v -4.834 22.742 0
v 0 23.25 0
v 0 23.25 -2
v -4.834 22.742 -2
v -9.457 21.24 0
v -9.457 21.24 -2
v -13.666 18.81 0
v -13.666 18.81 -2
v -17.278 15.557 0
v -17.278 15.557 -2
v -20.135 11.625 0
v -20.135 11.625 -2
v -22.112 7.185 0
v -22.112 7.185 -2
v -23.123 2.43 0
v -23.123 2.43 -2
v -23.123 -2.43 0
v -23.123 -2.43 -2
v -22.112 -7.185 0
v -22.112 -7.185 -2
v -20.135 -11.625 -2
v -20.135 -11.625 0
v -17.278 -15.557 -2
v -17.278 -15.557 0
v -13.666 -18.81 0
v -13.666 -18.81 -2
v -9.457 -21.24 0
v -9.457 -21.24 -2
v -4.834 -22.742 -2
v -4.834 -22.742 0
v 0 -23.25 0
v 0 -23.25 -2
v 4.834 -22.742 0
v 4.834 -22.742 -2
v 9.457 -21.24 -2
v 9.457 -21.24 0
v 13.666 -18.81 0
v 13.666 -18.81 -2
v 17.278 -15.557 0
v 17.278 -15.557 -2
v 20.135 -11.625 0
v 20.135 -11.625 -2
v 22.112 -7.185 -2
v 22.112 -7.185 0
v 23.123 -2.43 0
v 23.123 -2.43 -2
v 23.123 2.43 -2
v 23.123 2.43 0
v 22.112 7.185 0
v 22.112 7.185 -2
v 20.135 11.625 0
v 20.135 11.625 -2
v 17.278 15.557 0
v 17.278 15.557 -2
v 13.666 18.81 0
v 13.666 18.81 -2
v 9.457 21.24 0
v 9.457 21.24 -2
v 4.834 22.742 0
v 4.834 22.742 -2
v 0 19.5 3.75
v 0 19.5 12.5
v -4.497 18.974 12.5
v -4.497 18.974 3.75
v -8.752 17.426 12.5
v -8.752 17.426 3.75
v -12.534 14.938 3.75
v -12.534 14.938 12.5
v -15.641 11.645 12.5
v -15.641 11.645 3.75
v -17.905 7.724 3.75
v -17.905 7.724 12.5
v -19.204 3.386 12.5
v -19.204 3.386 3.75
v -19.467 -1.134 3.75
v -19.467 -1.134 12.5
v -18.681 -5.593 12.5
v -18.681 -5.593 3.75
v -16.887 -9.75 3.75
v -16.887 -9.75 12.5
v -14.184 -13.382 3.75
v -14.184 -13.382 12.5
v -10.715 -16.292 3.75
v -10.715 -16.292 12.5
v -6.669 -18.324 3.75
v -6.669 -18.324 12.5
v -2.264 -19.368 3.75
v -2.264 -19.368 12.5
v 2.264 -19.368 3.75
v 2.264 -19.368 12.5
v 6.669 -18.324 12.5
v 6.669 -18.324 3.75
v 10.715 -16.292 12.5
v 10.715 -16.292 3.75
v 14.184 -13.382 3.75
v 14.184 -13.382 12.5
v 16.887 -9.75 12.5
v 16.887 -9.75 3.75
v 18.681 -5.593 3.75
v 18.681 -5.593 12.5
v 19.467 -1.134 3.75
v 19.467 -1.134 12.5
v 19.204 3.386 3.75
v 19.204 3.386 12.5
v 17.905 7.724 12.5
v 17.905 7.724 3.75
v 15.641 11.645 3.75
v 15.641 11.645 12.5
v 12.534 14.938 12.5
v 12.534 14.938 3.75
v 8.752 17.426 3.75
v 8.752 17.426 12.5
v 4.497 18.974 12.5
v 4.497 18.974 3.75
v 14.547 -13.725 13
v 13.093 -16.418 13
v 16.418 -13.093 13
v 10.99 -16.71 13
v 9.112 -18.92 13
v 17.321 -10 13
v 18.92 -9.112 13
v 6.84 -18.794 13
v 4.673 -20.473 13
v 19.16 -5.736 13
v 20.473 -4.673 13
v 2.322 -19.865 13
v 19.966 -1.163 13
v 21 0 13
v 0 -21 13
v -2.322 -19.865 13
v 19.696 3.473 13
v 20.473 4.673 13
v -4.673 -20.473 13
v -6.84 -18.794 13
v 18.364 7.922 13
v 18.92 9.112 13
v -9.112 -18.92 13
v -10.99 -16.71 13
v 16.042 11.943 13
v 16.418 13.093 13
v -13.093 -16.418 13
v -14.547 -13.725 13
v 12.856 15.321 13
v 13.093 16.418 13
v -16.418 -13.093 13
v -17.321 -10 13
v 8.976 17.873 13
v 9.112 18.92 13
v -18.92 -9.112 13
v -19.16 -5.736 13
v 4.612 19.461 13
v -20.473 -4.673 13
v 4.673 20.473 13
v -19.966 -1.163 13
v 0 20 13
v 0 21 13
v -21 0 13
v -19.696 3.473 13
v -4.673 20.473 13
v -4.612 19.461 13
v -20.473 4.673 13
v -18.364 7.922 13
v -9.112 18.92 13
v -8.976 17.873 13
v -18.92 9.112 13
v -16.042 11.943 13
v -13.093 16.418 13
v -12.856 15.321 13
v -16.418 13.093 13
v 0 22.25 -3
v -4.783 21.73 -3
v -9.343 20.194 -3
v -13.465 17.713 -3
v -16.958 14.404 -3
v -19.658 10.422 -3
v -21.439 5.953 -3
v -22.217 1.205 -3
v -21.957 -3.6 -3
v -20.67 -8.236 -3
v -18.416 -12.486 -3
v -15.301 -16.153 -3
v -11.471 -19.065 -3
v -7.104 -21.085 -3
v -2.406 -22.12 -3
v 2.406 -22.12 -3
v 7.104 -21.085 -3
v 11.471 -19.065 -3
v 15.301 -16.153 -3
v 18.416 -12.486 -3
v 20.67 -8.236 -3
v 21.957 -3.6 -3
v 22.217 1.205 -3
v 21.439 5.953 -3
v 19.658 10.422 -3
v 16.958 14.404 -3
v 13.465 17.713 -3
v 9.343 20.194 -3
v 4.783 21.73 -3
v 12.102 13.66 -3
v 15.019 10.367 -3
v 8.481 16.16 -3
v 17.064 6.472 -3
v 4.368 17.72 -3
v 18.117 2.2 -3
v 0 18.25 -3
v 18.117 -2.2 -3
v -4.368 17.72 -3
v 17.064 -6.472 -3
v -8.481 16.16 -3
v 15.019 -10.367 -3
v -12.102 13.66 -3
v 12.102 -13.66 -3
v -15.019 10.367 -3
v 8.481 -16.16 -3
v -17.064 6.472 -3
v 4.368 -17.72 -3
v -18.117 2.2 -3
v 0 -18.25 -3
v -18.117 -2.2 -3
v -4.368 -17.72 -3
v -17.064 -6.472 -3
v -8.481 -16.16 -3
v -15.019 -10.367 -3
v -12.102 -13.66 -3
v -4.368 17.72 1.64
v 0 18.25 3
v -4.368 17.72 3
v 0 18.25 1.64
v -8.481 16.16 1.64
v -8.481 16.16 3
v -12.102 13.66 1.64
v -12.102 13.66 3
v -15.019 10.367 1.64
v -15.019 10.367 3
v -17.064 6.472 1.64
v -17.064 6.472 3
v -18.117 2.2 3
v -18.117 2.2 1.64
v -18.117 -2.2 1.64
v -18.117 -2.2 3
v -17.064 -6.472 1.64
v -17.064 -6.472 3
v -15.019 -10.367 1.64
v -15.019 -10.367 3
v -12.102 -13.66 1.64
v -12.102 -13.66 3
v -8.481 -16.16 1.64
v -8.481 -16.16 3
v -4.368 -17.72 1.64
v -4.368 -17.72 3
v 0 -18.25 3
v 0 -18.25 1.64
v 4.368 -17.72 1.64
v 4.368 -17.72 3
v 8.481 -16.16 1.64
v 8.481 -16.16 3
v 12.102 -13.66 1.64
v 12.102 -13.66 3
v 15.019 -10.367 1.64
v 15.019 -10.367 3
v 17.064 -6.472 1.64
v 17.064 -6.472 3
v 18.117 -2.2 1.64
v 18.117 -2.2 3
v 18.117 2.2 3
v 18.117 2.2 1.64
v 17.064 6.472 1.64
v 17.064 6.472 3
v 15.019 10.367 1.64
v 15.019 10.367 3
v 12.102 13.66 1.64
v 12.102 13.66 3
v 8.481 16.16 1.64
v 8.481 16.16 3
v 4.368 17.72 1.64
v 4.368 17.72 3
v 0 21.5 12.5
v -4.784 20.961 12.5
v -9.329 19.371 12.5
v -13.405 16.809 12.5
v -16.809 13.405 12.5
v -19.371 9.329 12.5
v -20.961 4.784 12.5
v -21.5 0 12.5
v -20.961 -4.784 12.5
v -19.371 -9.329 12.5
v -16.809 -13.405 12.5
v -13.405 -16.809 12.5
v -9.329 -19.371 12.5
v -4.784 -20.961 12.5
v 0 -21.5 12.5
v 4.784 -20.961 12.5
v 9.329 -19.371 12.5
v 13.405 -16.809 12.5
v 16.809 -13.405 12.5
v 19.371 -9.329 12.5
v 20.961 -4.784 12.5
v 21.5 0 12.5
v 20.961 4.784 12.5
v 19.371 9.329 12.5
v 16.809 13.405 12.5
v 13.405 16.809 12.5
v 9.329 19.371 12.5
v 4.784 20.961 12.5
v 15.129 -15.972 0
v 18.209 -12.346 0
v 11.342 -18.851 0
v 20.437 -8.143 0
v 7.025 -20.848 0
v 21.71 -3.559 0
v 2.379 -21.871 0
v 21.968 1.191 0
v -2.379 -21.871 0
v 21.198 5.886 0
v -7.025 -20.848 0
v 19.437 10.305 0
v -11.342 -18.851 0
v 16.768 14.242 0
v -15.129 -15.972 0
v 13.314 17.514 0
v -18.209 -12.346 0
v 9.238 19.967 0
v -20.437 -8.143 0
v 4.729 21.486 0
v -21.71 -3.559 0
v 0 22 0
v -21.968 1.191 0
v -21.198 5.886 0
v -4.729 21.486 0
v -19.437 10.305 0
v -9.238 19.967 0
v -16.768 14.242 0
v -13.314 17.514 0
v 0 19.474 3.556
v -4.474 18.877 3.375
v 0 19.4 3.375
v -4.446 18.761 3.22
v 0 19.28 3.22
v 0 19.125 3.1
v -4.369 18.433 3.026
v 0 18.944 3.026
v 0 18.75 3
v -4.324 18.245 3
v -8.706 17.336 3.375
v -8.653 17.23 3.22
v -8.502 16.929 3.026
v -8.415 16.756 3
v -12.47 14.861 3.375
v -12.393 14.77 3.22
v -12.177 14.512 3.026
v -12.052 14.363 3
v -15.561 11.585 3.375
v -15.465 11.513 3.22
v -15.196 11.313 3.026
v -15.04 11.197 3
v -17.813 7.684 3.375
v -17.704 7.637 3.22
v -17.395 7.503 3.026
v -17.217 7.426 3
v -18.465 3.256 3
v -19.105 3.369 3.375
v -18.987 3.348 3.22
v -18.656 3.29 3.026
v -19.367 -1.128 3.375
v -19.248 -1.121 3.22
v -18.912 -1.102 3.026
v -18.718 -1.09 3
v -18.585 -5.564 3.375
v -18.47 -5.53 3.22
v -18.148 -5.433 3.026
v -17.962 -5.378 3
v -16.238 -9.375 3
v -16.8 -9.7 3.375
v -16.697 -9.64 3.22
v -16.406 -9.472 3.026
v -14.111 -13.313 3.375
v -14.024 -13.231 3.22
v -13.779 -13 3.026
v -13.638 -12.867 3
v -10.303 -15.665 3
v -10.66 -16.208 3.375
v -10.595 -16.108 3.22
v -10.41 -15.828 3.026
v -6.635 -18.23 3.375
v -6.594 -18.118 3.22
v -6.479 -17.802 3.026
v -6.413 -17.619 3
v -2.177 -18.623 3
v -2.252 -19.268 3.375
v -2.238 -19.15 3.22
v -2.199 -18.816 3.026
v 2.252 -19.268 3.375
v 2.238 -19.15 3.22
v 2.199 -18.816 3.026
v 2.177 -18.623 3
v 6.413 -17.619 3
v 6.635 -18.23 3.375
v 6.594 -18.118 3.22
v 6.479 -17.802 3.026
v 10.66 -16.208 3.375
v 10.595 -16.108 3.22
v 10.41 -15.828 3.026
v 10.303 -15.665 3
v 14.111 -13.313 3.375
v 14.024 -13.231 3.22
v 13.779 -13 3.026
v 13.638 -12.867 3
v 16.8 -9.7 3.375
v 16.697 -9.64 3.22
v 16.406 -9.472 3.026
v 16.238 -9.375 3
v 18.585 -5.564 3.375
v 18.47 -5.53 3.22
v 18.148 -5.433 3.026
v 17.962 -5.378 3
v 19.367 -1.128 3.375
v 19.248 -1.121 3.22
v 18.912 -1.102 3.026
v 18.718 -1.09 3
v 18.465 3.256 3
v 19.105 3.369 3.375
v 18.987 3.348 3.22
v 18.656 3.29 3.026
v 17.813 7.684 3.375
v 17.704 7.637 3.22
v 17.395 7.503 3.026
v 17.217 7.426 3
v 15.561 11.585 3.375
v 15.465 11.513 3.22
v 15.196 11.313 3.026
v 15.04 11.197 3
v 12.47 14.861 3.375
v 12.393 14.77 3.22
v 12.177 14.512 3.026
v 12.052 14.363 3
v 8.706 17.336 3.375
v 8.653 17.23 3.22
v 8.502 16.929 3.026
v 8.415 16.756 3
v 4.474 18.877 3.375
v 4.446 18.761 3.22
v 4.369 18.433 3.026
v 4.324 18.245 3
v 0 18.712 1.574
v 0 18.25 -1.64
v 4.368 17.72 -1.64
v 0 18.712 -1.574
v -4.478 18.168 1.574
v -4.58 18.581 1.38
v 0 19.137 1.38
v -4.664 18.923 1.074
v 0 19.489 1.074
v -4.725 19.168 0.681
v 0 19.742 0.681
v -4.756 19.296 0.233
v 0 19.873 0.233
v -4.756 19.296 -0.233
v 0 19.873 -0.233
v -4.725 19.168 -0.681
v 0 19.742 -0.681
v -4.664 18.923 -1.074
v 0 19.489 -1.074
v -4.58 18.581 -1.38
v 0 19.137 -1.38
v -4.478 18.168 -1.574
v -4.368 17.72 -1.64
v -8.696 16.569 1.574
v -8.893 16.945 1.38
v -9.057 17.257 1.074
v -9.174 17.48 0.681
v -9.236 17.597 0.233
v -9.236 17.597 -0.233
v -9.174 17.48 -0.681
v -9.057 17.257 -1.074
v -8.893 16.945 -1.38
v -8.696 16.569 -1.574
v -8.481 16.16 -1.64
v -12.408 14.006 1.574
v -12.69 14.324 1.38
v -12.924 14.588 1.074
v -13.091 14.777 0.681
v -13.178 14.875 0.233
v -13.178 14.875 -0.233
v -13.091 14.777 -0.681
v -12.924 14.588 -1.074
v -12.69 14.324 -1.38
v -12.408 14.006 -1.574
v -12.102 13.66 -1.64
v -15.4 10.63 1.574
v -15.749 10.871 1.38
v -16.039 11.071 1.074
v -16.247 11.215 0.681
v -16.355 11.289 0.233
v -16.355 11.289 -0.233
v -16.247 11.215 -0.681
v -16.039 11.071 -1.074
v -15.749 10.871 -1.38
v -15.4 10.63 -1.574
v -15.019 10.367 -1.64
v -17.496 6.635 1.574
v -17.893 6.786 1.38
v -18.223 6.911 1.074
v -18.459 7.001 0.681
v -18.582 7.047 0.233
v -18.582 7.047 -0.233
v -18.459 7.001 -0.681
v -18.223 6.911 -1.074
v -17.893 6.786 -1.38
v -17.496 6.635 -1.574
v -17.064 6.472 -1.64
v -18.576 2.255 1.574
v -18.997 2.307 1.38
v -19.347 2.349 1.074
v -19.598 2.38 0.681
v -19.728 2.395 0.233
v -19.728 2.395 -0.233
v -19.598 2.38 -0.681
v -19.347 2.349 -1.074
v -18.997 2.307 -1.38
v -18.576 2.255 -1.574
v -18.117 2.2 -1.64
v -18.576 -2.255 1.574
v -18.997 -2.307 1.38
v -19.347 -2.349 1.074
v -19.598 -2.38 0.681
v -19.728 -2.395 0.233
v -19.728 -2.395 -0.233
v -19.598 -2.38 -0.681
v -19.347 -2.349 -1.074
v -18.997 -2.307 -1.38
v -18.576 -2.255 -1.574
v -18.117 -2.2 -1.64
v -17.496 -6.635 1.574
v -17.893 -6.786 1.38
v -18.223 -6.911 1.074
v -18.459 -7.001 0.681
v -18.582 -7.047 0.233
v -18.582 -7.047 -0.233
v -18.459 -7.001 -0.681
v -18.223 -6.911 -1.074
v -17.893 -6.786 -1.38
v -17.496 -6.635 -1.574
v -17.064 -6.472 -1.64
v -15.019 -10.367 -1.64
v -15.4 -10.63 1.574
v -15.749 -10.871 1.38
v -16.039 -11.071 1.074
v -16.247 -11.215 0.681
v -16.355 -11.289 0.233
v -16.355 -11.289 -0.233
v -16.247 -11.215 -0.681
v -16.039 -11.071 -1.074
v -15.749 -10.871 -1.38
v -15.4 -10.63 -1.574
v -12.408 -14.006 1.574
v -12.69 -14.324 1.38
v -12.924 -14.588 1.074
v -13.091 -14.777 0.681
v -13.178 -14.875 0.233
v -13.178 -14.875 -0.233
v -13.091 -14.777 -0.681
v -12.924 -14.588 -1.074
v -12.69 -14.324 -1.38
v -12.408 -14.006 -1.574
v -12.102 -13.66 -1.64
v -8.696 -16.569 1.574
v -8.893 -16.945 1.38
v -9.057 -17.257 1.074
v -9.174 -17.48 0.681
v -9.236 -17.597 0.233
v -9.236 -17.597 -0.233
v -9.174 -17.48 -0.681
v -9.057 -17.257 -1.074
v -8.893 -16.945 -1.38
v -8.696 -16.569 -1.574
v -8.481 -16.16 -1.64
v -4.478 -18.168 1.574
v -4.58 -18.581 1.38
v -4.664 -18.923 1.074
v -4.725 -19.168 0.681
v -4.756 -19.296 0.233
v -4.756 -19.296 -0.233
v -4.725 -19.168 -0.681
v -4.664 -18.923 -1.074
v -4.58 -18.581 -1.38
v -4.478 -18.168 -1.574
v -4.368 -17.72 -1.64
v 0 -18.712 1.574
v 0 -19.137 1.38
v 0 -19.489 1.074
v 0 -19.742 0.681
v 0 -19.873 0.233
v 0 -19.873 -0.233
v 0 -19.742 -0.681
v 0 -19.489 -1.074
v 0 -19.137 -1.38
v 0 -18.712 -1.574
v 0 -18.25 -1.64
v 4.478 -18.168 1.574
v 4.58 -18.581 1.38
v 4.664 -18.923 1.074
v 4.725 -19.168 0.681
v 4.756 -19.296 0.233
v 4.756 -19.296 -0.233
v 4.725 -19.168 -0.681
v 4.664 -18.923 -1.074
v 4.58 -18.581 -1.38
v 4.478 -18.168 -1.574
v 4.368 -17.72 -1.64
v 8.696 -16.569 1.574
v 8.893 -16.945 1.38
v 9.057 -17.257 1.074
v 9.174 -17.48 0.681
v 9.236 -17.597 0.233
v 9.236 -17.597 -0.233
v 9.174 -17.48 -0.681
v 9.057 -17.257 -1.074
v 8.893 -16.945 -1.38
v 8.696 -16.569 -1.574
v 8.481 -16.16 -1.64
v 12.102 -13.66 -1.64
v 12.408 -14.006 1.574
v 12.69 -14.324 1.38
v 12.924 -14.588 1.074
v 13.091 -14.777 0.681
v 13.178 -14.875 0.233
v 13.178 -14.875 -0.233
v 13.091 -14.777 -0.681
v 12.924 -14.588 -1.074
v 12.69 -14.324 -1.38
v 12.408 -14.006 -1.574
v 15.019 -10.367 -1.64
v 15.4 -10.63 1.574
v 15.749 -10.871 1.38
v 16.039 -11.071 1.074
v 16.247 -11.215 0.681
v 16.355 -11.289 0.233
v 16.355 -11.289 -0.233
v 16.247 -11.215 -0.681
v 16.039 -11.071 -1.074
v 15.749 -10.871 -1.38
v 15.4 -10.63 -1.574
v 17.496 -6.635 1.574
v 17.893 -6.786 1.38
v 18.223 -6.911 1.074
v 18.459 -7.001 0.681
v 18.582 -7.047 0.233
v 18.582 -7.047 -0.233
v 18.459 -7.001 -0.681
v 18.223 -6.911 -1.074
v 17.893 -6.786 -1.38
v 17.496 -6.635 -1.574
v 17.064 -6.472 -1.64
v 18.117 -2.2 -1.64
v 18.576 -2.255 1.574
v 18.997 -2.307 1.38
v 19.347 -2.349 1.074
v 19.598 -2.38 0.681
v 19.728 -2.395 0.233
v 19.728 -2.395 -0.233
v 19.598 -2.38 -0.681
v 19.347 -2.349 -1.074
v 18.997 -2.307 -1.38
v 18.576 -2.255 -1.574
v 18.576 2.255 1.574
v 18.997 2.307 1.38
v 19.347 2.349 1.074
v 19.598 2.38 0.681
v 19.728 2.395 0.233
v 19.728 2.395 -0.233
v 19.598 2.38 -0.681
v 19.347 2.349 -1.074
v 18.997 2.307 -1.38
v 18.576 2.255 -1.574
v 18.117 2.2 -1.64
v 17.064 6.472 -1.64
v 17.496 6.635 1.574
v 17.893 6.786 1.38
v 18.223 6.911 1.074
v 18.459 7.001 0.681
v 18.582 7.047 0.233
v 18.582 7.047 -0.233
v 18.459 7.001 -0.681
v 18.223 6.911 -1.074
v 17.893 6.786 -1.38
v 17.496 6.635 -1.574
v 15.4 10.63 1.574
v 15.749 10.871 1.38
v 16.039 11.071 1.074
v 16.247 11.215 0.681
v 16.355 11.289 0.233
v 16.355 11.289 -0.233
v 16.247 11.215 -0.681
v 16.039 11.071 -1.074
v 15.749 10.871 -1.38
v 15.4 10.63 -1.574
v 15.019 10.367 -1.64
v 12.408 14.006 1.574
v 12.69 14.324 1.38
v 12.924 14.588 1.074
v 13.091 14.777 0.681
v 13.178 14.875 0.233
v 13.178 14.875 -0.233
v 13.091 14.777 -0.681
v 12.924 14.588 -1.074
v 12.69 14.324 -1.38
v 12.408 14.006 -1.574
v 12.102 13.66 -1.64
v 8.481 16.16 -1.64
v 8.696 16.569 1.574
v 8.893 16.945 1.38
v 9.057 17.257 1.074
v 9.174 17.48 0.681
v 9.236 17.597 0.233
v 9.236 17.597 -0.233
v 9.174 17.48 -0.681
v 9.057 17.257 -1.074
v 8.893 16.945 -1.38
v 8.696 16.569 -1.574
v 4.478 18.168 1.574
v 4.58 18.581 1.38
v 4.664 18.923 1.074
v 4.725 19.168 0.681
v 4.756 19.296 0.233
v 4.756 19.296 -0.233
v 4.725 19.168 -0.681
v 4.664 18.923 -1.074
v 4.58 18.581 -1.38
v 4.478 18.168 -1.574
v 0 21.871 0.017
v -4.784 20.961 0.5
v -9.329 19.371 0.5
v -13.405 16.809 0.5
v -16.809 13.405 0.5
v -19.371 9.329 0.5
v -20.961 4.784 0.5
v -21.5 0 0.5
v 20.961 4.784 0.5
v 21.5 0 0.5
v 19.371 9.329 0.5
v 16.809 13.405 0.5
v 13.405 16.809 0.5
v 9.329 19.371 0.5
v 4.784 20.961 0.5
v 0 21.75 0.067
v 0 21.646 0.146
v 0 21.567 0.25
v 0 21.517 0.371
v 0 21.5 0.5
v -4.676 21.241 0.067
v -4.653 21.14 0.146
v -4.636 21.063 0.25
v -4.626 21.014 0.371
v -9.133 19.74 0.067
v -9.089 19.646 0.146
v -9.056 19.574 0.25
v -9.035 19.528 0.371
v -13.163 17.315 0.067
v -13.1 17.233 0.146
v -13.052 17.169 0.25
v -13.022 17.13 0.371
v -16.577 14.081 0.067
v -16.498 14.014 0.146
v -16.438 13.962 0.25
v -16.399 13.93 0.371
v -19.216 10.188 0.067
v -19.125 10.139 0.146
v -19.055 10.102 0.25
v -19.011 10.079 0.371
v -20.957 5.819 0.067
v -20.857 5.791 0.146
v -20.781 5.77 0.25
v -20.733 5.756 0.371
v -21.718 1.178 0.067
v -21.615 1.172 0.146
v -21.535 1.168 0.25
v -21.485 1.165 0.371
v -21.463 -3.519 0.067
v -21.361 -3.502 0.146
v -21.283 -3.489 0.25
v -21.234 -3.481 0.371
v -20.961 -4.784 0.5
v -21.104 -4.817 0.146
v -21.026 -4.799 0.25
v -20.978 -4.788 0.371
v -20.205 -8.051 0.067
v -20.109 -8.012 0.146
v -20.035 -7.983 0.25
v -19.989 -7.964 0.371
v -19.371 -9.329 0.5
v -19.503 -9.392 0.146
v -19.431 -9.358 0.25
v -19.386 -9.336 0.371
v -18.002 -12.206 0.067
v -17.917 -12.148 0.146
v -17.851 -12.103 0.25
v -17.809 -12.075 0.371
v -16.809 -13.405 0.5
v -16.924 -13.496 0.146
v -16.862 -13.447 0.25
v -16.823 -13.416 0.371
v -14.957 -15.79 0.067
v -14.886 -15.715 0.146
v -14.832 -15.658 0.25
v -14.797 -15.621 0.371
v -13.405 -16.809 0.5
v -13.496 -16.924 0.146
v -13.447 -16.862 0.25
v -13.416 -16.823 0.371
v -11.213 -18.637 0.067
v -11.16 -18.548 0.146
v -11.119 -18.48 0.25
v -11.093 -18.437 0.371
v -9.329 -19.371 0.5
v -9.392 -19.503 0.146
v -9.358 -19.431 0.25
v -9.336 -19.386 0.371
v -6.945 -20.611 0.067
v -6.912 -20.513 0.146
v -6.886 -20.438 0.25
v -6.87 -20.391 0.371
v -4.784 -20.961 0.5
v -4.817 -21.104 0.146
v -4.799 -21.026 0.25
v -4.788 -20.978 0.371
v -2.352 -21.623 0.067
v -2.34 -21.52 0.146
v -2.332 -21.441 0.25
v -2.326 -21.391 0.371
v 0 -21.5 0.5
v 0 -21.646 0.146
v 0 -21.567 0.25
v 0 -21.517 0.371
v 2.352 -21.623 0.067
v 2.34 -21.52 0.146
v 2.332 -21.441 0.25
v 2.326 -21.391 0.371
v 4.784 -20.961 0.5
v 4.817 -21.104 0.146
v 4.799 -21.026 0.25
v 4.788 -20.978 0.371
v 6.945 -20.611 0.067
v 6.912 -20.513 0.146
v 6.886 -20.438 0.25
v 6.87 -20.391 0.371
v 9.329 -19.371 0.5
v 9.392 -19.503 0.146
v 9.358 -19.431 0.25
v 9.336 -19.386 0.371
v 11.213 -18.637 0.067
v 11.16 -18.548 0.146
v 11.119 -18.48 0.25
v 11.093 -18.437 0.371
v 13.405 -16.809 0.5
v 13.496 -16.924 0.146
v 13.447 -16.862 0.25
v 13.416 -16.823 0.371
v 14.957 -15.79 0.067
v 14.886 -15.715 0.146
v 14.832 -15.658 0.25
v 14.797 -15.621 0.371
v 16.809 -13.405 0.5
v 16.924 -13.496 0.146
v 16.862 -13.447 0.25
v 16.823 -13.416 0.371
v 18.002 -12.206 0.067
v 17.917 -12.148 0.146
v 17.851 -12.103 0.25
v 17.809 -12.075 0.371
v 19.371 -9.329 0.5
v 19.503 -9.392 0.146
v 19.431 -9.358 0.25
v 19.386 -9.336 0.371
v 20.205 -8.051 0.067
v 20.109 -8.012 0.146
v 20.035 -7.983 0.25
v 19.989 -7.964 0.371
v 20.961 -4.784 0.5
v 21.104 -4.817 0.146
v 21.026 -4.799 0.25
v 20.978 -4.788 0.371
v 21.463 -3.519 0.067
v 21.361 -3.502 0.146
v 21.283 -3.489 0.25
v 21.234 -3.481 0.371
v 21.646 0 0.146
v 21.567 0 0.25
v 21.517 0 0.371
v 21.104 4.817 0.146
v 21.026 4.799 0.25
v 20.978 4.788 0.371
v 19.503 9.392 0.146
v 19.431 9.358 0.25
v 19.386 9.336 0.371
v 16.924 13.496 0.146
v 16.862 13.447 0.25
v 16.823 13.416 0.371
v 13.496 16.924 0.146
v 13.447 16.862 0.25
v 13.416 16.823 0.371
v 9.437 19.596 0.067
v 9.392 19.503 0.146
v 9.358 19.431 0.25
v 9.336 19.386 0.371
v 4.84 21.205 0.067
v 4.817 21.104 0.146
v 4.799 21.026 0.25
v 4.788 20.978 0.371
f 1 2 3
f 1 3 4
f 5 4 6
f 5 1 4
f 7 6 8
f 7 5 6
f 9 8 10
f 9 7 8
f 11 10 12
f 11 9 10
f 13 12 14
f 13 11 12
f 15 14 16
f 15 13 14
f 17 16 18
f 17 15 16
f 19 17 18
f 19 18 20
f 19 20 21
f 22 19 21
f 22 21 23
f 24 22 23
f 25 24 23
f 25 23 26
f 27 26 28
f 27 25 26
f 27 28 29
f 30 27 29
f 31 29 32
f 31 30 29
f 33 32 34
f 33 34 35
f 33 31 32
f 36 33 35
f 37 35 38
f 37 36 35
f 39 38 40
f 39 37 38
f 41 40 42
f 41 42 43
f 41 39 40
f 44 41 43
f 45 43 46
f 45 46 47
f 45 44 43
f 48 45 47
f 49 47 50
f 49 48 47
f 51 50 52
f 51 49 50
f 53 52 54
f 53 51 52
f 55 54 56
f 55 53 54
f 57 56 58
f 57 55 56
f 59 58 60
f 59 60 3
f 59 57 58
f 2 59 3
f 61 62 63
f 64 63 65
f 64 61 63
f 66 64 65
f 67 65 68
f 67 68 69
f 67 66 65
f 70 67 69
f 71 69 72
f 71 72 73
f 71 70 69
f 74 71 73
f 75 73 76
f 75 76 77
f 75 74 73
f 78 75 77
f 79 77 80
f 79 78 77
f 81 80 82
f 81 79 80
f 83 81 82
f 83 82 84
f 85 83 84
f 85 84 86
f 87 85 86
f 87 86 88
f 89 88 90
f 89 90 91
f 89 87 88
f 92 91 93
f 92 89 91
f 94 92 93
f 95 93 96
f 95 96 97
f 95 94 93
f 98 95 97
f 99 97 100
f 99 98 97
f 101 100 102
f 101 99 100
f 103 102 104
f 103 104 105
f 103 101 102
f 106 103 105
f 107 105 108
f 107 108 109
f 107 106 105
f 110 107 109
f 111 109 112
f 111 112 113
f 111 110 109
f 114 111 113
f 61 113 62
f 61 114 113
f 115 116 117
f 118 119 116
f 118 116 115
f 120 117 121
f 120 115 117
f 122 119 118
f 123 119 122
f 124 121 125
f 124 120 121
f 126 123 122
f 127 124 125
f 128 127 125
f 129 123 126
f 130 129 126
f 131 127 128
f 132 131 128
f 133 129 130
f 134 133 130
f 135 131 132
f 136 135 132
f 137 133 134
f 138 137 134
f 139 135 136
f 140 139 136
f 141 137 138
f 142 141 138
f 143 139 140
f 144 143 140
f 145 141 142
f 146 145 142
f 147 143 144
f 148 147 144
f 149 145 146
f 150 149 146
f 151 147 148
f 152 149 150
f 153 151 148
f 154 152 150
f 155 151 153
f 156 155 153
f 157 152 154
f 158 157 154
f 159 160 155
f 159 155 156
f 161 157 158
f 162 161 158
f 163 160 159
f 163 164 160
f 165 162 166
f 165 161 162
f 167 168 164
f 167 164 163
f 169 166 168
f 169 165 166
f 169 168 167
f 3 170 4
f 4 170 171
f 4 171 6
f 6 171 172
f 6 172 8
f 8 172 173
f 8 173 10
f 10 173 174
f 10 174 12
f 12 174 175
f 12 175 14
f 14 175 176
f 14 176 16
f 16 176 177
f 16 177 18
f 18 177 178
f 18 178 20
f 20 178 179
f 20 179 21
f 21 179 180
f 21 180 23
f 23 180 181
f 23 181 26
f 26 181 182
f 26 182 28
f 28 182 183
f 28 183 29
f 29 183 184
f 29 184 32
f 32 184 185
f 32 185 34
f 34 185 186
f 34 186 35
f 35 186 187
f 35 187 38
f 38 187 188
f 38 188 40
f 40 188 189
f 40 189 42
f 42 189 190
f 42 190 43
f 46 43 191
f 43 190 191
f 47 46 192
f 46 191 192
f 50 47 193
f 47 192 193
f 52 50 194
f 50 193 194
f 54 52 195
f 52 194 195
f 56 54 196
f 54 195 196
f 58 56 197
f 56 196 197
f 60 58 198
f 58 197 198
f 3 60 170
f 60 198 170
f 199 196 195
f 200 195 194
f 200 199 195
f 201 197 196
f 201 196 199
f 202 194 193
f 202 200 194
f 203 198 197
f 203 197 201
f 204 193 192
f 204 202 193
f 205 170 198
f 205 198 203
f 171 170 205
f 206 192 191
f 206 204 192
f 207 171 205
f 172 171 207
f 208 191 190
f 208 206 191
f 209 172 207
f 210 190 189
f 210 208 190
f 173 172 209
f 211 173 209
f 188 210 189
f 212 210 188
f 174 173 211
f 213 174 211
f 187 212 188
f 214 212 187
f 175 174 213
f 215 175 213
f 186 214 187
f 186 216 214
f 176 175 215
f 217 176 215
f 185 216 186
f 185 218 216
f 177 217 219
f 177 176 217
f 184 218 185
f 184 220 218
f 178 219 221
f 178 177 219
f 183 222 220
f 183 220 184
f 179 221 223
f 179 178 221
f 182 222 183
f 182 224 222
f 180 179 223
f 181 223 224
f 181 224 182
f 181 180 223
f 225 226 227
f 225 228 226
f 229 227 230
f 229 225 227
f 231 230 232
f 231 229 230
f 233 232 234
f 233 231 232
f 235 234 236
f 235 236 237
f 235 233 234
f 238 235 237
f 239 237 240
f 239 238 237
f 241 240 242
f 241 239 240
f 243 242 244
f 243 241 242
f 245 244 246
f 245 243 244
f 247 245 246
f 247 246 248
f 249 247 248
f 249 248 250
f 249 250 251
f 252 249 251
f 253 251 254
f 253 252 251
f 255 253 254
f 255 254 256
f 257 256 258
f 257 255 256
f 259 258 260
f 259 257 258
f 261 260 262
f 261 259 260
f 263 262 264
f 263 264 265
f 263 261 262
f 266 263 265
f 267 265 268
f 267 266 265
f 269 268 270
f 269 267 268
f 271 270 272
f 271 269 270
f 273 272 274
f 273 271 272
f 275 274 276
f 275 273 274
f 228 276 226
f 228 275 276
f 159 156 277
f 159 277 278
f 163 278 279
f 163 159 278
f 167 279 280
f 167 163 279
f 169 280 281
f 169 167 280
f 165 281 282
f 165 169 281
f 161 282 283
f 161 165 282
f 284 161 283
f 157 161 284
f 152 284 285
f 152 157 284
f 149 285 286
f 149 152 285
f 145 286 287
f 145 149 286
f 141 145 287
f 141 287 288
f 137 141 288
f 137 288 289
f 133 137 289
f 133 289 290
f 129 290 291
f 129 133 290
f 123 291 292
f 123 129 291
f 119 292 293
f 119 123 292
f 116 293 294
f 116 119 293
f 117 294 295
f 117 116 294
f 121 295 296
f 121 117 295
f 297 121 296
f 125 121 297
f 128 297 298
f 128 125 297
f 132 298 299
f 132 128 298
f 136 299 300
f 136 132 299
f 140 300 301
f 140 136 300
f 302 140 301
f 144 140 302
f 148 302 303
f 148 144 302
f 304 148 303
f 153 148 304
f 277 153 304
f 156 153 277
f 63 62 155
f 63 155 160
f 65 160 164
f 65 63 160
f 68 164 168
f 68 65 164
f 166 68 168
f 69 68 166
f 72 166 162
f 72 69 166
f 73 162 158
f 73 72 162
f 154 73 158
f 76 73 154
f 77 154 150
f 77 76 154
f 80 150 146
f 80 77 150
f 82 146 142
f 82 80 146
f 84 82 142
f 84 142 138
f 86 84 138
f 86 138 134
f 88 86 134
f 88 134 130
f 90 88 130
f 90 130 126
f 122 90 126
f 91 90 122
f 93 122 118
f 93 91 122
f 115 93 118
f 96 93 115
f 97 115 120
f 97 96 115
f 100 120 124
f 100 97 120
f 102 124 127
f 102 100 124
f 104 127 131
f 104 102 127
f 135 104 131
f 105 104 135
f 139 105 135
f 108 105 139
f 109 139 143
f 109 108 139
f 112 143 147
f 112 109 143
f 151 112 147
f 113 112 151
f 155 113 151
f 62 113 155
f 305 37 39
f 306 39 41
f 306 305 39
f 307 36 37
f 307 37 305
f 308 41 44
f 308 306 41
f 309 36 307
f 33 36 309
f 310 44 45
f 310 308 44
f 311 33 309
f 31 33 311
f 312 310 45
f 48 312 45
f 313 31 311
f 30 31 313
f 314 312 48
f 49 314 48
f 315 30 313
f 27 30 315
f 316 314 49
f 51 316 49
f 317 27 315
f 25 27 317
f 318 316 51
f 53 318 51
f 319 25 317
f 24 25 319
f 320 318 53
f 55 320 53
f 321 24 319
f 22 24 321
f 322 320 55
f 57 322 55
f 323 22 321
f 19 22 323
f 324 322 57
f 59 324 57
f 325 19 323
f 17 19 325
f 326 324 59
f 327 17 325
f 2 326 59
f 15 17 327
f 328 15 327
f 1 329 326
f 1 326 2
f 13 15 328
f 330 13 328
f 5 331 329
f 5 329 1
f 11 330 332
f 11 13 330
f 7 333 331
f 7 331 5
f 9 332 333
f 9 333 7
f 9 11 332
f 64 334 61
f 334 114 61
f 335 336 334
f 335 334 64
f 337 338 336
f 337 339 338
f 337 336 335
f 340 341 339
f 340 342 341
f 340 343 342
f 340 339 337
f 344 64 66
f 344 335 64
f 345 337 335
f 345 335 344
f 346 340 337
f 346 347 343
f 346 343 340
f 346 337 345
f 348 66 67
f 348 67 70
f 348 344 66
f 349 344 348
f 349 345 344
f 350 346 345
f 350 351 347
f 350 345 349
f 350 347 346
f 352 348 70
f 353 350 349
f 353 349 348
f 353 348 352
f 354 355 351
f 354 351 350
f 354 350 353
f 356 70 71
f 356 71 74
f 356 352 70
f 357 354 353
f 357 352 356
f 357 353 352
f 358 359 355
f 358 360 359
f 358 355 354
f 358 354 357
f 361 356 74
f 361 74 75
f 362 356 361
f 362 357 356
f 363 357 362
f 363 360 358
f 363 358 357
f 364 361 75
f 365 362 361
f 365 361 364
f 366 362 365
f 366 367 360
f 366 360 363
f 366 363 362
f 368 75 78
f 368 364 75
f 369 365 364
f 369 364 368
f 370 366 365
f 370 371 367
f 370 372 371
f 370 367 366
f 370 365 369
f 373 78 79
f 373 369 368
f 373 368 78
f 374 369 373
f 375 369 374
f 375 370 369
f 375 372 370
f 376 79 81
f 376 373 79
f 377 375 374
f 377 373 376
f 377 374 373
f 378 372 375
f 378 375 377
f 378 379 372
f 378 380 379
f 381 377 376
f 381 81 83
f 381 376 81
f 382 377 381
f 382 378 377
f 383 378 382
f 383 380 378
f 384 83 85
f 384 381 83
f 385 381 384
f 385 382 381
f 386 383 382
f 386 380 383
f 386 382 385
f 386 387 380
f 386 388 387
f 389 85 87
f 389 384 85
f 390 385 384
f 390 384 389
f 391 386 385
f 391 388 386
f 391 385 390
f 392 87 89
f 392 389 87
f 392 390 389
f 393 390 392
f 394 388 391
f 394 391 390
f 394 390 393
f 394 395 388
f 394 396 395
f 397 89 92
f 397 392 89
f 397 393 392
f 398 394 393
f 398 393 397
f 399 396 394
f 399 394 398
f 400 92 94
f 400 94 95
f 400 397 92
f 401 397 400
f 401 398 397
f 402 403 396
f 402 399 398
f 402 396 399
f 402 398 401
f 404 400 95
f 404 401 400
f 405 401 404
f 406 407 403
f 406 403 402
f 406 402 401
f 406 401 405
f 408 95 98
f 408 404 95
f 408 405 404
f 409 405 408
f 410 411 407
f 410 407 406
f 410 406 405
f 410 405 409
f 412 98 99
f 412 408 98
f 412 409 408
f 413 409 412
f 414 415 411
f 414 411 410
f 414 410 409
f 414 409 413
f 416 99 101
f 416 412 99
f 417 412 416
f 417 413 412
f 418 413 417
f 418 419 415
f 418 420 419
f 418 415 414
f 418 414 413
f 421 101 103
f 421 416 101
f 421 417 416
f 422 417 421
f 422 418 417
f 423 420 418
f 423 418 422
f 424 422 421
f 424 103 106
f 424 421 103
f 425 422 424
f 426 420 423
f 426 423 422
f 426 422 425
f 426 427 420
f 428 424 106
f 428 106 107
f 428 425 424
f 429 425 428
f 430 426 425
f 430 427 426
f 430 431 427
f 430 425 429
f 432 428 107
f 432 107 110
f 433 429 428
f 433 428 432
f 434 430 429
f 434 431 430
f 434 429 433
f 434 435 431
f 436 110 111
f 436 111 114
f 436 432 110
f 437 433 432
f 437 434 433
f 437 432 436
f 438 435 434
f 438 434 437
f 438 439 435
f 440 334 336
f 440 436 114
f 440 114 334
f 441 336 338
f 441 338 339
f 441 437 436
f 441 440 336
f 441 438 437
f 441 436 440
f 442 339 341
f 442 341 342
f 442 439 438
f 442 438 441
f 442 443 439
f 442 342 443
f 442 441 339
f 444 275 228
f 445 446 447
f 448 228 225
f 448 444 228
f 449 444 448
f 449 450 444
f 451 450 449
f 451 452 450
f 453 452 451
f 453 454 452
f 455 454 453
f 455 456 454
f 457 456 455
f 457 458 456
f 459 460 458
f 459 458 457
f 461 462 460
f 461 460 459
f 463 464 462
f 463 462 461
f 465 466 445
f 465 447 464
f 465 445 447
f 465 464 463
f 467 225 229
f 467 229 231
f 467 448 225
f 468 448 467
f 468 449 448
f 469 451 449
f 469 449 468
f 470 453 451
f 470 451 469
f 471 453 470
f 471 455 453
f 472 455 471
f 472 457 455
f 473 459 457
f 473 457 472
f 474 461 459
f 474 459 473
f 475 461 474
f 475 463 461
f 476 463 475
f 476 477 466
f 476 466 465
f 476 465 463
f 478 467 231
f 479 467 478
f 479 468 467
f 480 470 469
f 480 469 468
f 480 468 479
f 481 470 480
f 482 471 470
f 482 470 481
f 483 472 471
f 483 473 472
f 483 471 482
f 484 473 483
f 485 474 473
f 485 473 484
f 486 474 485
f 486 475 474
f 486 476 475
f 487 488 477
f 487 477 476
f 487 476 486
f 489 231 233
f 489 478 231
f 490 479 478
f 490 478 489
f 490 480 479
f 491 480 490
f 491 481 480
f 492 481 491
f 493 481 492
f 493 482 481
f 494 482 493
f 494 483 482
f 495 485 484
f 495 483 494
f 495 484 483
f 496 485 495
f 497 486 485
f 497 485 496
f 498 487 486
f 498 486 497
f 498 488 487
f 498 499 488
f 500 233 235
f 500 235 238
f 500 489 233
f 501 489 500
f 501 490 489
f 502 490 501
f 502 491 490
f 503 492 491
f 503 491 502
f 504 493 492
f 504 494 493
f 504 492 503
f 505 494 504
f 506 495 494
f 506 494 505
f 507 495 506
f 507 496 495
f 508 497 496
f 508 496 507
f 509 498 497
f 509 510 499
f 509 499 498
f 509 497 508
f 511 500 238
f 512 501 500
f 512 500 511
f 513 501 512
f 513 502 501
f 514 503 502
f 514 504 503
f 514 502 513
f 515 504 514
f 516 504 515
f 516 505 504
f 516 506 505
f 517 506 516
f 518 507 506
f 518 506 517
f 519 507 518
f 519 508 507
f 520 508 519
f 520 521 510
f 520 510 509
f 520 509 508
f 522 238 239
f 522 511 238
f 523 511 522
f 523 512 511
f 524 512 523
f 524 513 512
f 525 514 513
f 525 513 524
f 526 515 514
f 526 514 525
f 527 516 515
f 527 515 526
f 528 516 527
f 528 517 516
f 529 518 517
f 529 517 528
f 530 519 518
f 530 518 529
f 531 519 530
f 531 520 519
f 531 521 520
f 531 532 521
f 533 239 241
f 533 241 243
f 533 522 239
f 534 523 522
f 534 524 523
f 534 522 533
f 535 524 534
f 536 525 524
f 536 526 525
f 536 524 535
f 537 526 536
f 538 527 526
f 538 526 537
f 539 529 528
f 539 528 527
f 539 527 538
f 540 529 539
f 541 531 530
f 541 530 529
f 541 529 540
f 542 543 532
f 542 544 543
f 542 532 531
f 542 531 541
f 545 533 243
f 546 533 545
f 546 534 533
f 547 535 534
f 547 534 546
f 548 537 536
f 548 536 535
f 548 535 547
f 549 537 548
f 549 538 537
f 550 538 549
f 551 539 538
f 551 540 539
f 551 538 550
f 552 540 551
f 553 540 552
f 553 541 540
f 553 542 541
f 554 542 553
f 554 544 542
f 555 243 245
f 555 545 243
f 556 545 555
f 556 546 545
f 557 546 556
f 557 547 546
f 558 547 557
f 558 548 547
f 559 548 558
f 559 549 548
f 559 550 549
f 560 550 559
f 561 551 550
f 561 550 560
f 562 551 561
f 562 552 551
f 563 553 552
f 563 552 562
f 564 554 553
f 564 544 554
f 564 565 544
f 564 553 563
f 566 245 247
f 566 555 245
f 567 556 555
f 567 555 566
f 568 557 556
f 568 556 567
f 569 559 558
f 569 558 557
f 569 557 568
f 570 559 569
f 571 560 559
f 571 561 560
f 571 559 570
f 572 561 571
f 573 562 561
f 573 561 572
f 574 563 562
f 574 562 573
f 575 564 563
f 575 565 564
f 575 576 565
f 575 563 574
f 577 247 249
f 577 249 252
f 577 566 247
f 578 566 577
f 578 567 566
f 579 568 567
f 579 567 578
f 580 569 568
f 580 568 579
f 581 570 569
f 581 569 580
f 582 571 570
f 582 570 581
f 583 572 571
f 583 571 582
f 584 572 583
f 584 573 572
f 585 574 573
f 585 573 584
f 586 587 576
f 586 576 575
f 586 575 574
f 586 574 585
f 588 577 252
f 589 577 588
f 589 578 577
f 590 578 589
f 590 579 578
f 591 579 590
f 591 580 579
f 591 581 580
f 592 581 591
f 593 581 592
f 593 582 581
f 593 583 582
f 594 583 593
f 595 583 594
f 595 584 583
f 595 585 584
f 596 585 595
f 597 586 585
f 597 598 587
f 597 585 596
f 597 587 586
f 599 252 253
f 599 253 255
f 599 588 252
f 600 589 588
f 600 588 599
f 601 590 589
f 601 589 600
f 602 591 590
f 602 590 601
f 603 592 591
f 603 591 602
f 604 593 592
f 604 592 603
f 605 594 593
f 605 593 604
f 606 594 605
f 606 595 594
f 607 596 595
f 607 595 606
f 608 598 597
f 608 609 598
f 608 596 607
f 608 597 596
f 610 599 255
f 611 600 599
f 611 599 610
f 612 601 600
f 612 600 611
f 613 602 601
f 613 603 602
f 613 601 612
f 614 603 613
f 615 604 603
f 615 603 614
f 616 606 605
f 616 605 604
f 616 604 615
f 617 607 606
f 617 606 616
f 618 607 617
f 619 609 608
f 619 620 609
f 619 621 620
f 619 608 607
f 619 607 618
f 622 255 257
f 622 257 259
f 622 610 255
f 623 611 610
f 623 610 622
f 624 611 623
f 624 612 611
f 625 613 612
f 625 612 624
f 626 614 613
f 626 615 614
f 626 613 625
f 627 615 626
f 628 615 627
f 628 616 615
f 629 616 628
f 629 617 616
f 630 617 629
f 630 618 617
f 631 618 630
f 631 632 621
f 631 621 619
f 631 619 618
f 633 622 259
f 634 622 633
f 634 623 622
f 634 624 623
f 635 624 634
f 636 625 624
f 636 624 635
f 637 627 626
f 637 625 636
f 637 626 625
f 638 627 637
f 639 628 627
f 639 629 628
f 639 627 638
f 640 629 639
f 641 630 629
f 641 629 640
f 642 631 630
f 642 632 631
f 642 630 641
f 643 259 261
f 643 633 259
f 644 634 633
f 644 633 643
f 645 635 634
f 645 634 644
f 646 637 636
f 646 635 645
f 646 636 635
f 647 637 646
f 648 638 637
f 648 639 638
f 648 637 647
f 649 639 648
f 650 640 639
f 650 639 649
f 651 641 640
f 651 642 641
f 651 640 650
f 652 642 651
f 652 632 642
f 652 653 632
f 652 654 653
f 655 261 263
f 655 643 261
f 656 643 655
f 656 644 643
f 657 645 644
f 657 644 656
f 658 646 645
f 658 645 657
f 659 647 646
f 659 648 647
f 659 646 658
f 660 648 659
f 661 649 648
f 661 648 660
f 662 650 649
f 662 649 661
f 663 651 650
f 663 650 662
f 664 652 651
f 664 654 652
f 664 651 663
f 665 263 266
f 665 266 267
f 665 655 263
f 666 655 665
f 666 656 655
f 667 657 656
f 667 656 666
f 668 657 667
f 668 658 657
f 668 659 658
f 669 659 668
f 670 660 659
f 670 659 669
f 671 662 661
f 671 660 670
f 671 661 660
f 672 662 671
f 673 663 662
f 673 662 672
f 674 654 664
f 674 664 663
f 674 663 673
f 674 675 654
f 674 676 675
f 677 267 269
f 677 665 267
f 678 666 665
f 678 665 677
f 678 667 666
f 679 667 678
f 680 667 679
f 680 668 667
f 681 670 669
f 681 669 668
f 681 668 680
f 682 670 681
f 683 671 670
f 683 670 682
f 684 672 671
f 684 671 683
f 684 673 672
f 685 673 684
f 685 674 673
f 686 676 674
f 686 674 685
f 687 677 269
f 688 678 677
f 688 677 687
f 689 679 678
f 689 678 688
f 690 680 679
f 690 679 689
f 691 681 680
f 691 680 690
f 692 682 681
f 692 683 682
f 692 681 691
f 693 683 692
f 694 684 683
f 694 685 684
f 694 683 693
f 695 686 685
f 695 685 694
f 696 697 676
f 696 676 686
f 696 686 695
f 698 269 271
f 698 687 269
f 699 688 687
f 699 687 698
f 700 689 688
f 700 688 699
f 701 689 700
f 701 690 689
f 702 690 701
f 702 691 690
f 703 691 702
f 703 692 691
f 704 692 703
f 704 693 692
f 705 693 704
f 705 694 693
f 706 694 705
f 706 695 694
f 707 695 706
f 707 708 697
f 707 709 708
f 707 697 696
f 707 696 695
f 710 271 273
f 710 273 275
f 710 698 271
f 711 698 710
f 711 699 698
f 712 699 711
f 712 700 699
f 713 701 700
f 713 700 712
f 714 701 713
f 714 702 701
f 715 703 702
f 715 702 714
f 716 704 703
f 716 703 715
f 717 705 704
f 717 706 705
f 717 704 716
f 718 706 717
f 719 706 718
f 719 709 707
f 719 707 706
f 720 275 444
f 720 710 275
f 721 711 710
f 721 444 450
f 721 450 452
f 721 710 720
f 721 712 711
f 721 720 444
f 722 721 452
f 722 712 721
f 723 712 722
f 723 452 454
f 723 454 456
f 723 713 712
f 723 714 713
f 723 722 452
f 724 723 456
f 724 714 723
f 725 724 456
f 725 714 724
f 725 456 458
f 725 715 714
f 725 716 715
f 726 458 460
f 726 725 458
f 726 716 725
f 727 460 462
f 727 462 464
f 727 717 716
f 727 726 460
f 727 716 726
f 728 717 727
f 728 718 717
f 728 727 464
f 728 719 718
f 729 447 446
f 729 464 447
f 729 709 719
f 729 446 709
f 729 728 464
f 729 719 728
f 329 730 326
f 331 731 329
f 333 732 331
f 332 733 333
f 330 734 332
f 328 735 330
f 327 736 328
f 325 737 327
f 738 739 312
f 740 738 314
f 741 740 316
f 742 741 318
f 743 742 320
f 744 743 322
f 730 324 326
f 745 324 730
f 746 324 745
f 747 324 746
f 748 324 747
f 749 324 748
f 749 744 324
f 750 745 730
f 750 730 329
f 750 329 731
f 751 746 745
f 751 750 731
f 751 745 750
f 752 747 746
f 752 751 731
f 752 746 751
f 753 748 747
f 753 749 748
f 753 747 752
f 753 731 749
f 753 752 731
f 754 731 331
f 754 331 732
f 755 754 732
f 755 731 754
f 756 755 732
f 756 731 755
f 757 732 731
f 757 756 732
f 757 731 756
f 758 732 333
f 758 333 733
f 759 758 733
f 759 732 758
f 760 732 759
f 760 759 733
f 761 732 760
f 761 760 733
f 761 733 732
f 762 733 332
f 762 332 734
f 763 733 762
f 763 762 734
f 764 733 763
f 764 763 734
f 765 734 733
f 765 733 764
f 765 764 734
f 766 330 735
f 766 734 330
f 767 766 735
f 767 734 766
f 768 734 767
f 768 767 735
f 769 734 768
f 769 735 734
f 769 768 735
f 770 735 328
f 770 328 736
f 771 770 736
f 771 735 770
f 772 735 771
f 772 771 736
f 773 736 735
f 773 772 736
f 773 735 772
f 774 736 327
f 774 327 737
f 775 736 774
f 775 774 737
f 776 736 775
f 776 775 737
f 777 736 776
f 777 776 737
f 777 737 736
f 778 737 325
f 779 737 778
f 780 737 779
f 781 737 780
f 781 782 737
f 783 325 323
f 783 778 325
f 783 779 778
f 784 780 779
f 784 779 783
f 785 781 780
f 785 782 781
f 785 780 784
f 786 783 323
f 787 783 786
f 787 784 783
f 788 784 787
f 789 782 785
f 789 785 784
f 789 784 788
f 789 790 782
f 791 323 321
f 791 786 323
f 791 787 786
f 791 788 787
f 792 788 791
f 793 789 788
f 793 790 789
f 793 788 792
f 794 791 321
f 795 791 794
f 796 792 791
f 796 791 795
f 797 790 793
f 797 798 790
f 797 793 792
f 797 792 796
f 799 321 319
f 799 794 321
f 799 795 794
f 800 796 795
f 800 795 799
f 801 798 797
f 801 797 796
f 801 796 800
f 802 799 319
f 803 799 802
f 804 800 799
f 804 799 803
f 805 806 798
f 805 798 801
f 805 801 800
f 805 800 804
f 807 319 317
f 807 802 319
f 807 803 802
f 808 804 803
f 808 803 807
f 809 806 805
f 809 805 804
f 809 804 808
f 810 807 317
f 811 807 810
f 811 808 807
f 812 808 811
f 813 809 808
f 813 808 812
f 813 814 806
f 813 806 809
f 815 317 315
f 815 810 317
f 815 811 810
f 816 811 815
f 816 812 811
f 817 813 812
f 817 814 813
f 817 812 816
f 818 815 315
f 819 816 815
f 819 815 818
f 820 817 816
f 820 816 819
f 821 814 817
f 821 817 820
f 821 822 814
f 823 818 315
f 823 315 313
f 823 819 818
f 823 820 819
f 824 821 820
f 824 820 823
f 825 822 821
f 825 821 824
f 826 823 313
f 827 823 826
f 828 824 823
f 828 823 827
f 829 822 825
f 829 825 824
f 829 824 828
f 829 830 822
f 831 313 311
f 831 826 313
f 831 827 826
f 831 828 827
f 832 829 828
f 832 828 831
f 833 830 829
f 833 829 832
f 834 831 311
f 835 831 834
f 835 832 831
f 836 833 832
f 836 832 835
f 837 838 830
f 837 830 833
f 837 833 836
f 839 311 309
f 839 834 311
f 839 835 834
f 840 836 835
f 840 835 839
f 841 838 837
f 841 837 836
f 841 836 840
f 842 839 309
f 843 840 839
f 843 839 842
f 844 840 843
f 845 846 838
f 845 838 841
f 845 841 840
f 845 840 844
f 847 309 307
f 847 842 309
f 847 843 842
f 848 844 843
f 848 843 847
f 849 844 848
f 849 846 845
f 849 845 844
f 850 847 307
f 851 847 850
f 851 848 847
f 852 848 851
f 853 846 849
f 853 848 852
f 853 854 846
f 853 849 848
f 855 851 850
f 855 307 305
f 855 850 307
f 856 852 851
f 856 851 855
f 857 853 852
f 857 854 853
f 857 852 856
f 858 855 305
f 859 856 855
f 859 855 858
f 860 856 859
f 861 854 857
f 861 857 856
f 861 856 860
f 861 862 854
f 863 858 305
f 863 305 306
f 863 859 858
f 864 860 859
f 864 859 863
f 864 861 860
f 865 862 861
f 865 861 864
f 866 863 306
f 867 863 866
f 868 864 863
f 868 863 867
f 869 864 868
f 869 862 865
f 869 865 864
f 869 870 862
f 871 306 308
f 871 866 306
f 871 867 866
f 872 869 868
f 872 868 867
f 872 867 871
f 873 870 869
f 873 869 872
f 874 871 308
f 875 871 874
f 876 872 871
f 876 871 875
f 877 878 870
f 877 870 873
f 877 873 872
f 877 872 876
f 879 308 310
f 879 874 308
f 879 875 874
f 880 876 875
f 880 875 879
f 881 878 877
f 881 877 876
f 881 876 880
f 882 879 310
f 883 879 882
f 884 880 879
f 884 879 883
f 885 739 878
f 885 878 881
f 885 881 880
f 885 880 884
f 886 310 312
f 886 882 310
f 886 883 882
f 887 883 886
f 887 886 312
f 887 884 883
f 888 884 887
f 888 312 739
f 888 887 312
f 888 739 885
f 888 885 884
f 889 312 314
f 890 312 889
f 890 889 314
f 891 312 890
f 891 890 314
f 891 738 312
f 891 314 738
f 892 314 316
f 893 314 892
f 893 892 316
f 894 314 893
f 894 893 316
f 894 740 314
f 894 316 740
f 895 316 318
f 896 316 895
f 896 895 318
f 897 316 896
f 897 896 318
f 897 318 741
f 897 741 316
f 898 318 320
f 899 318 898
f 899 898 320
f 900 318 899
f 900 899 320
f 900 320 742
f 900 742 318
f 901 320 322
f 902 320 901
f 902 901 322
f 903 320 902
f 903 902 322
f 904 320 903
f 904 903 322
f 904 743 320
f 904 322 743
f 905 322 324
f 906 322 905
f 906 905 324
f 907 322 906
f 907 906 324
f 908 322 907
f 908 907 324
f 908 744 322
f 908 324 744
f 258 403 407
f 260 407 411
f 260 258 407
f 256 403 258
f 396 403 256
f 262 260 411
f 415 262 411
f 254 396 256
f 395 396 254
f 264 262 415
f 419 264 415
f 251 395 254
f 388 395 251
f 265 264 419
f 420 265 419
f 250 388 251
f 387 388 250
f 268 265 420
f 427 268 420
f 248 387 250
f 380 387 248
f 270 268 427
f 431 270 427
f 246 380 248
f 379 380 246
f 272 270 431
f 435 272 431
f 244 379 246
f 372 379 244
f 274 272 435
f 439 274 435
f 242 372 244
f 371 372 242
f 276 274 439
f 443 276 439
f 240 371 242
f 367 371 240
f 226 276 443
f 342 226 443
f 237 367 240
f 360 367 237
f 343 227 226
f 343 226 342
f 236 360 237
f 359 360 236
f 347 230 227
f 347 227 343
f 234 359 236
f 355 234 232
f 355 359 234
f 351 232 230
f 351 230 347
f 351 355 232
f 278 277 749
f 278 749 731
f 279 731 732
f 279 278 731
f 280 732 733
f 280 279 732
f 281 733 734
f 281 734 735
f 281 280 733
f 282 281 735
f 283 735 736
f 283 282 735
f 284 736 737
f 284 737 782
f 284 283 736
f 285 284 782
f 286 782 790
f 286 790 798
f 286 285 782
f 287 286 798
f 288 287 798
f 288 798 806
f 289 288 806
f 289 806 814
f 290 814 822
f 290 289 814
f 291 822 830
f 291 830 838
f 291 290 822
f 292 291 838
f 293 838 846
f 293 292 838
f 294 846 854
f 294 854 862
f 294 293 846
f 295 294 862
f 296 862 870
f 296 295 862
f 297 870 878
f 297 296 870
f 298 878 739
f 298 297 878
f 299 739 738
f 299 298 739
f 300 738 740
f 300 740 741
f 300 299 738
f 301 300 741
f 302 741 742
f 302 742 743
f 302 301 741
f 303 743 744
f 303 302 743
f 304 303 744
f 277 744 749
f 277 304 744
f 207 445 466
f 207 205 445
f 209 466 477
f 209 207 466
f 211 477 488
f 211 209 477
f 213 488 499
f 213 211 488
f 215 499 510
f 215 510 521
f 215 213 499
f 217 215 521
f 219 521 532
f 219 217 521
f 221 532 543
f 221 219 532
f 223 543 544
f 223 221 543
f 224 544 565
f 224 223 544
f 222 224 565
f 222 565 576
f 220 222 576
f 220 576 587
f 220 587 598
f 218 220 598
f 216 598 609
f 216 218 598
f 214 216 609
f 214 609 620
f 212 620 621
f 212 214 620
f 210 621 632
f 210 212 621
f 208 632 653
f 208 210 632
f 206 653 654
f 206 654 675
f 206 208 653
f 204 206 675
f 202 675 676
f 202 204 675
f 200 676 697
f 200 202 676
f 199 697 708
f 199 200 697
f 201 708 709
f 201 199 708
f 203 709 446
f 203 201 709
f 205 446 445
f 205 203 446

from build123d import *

# Parameters (mm, degrees)
F2_R    = 0.5
F3_SIZE = 1
F4_SIZE = 0.5
F5_R    = 0.75


with BuildPart() as f1:
    # F0 (on Right) → F1 (revolve)
    with BuildSketch(Plane.YZ):
        with BuildLine():
            Line((19.5, 3), (18.25, 3))
            Line((18.25, 3), (18.25, 1.64))
            ThreePointArc((18.25, 1.64), (19.89, 0), (18.25, -1.64))
            Line((18.25, -1.64), (18.25, -3))
            Line((18.25, -3), (23.25, -3))
            Line((23.25, -3), (23.25, 0))
            Line((23.25, 0), (21.5, 0))
            Line((21.5, 0), (21.5, 3))
            Line((21.5, 3), (19.5, 3))
        make_face()
        Polygon((19.5, 11), (19.5, 3), (21.5, 3), (21.5, 13), (19.5, 13), align=None)
    revolve(axis=Axis((0, 0, 4.880332), (0, 0, 1)))

    # F2
    f2_edges = [f1.edges().sort_by_distance(p)[0] for p in [
        (0, -21.5, 0),
    ]]
    fillet(f2_edges, radius=F2_R)

    # F3
    f3_edges = [f1.edges().sort_by_distance(p)[0] for p in [
        (0, -23.25, -3),
    ]]
    chamfer(f3_edges, length=F3_SIZE)

    # F4
    f4_edges = [f1.edges().sort_by_distance(p)[0] for p in [
        (0, -21.5, 13),
        (0, -19.5, 13),
    ]]
    chamfer(f4_edges, length=F4_SIZE)

    # F5
    f5_edges = [f1.edges().sort_by_distance(p)[0] for p in [
        (0, -19.5, 3),
    ]]
    fillet(f5_edges, radius=F5_R)


solid = f1.part
